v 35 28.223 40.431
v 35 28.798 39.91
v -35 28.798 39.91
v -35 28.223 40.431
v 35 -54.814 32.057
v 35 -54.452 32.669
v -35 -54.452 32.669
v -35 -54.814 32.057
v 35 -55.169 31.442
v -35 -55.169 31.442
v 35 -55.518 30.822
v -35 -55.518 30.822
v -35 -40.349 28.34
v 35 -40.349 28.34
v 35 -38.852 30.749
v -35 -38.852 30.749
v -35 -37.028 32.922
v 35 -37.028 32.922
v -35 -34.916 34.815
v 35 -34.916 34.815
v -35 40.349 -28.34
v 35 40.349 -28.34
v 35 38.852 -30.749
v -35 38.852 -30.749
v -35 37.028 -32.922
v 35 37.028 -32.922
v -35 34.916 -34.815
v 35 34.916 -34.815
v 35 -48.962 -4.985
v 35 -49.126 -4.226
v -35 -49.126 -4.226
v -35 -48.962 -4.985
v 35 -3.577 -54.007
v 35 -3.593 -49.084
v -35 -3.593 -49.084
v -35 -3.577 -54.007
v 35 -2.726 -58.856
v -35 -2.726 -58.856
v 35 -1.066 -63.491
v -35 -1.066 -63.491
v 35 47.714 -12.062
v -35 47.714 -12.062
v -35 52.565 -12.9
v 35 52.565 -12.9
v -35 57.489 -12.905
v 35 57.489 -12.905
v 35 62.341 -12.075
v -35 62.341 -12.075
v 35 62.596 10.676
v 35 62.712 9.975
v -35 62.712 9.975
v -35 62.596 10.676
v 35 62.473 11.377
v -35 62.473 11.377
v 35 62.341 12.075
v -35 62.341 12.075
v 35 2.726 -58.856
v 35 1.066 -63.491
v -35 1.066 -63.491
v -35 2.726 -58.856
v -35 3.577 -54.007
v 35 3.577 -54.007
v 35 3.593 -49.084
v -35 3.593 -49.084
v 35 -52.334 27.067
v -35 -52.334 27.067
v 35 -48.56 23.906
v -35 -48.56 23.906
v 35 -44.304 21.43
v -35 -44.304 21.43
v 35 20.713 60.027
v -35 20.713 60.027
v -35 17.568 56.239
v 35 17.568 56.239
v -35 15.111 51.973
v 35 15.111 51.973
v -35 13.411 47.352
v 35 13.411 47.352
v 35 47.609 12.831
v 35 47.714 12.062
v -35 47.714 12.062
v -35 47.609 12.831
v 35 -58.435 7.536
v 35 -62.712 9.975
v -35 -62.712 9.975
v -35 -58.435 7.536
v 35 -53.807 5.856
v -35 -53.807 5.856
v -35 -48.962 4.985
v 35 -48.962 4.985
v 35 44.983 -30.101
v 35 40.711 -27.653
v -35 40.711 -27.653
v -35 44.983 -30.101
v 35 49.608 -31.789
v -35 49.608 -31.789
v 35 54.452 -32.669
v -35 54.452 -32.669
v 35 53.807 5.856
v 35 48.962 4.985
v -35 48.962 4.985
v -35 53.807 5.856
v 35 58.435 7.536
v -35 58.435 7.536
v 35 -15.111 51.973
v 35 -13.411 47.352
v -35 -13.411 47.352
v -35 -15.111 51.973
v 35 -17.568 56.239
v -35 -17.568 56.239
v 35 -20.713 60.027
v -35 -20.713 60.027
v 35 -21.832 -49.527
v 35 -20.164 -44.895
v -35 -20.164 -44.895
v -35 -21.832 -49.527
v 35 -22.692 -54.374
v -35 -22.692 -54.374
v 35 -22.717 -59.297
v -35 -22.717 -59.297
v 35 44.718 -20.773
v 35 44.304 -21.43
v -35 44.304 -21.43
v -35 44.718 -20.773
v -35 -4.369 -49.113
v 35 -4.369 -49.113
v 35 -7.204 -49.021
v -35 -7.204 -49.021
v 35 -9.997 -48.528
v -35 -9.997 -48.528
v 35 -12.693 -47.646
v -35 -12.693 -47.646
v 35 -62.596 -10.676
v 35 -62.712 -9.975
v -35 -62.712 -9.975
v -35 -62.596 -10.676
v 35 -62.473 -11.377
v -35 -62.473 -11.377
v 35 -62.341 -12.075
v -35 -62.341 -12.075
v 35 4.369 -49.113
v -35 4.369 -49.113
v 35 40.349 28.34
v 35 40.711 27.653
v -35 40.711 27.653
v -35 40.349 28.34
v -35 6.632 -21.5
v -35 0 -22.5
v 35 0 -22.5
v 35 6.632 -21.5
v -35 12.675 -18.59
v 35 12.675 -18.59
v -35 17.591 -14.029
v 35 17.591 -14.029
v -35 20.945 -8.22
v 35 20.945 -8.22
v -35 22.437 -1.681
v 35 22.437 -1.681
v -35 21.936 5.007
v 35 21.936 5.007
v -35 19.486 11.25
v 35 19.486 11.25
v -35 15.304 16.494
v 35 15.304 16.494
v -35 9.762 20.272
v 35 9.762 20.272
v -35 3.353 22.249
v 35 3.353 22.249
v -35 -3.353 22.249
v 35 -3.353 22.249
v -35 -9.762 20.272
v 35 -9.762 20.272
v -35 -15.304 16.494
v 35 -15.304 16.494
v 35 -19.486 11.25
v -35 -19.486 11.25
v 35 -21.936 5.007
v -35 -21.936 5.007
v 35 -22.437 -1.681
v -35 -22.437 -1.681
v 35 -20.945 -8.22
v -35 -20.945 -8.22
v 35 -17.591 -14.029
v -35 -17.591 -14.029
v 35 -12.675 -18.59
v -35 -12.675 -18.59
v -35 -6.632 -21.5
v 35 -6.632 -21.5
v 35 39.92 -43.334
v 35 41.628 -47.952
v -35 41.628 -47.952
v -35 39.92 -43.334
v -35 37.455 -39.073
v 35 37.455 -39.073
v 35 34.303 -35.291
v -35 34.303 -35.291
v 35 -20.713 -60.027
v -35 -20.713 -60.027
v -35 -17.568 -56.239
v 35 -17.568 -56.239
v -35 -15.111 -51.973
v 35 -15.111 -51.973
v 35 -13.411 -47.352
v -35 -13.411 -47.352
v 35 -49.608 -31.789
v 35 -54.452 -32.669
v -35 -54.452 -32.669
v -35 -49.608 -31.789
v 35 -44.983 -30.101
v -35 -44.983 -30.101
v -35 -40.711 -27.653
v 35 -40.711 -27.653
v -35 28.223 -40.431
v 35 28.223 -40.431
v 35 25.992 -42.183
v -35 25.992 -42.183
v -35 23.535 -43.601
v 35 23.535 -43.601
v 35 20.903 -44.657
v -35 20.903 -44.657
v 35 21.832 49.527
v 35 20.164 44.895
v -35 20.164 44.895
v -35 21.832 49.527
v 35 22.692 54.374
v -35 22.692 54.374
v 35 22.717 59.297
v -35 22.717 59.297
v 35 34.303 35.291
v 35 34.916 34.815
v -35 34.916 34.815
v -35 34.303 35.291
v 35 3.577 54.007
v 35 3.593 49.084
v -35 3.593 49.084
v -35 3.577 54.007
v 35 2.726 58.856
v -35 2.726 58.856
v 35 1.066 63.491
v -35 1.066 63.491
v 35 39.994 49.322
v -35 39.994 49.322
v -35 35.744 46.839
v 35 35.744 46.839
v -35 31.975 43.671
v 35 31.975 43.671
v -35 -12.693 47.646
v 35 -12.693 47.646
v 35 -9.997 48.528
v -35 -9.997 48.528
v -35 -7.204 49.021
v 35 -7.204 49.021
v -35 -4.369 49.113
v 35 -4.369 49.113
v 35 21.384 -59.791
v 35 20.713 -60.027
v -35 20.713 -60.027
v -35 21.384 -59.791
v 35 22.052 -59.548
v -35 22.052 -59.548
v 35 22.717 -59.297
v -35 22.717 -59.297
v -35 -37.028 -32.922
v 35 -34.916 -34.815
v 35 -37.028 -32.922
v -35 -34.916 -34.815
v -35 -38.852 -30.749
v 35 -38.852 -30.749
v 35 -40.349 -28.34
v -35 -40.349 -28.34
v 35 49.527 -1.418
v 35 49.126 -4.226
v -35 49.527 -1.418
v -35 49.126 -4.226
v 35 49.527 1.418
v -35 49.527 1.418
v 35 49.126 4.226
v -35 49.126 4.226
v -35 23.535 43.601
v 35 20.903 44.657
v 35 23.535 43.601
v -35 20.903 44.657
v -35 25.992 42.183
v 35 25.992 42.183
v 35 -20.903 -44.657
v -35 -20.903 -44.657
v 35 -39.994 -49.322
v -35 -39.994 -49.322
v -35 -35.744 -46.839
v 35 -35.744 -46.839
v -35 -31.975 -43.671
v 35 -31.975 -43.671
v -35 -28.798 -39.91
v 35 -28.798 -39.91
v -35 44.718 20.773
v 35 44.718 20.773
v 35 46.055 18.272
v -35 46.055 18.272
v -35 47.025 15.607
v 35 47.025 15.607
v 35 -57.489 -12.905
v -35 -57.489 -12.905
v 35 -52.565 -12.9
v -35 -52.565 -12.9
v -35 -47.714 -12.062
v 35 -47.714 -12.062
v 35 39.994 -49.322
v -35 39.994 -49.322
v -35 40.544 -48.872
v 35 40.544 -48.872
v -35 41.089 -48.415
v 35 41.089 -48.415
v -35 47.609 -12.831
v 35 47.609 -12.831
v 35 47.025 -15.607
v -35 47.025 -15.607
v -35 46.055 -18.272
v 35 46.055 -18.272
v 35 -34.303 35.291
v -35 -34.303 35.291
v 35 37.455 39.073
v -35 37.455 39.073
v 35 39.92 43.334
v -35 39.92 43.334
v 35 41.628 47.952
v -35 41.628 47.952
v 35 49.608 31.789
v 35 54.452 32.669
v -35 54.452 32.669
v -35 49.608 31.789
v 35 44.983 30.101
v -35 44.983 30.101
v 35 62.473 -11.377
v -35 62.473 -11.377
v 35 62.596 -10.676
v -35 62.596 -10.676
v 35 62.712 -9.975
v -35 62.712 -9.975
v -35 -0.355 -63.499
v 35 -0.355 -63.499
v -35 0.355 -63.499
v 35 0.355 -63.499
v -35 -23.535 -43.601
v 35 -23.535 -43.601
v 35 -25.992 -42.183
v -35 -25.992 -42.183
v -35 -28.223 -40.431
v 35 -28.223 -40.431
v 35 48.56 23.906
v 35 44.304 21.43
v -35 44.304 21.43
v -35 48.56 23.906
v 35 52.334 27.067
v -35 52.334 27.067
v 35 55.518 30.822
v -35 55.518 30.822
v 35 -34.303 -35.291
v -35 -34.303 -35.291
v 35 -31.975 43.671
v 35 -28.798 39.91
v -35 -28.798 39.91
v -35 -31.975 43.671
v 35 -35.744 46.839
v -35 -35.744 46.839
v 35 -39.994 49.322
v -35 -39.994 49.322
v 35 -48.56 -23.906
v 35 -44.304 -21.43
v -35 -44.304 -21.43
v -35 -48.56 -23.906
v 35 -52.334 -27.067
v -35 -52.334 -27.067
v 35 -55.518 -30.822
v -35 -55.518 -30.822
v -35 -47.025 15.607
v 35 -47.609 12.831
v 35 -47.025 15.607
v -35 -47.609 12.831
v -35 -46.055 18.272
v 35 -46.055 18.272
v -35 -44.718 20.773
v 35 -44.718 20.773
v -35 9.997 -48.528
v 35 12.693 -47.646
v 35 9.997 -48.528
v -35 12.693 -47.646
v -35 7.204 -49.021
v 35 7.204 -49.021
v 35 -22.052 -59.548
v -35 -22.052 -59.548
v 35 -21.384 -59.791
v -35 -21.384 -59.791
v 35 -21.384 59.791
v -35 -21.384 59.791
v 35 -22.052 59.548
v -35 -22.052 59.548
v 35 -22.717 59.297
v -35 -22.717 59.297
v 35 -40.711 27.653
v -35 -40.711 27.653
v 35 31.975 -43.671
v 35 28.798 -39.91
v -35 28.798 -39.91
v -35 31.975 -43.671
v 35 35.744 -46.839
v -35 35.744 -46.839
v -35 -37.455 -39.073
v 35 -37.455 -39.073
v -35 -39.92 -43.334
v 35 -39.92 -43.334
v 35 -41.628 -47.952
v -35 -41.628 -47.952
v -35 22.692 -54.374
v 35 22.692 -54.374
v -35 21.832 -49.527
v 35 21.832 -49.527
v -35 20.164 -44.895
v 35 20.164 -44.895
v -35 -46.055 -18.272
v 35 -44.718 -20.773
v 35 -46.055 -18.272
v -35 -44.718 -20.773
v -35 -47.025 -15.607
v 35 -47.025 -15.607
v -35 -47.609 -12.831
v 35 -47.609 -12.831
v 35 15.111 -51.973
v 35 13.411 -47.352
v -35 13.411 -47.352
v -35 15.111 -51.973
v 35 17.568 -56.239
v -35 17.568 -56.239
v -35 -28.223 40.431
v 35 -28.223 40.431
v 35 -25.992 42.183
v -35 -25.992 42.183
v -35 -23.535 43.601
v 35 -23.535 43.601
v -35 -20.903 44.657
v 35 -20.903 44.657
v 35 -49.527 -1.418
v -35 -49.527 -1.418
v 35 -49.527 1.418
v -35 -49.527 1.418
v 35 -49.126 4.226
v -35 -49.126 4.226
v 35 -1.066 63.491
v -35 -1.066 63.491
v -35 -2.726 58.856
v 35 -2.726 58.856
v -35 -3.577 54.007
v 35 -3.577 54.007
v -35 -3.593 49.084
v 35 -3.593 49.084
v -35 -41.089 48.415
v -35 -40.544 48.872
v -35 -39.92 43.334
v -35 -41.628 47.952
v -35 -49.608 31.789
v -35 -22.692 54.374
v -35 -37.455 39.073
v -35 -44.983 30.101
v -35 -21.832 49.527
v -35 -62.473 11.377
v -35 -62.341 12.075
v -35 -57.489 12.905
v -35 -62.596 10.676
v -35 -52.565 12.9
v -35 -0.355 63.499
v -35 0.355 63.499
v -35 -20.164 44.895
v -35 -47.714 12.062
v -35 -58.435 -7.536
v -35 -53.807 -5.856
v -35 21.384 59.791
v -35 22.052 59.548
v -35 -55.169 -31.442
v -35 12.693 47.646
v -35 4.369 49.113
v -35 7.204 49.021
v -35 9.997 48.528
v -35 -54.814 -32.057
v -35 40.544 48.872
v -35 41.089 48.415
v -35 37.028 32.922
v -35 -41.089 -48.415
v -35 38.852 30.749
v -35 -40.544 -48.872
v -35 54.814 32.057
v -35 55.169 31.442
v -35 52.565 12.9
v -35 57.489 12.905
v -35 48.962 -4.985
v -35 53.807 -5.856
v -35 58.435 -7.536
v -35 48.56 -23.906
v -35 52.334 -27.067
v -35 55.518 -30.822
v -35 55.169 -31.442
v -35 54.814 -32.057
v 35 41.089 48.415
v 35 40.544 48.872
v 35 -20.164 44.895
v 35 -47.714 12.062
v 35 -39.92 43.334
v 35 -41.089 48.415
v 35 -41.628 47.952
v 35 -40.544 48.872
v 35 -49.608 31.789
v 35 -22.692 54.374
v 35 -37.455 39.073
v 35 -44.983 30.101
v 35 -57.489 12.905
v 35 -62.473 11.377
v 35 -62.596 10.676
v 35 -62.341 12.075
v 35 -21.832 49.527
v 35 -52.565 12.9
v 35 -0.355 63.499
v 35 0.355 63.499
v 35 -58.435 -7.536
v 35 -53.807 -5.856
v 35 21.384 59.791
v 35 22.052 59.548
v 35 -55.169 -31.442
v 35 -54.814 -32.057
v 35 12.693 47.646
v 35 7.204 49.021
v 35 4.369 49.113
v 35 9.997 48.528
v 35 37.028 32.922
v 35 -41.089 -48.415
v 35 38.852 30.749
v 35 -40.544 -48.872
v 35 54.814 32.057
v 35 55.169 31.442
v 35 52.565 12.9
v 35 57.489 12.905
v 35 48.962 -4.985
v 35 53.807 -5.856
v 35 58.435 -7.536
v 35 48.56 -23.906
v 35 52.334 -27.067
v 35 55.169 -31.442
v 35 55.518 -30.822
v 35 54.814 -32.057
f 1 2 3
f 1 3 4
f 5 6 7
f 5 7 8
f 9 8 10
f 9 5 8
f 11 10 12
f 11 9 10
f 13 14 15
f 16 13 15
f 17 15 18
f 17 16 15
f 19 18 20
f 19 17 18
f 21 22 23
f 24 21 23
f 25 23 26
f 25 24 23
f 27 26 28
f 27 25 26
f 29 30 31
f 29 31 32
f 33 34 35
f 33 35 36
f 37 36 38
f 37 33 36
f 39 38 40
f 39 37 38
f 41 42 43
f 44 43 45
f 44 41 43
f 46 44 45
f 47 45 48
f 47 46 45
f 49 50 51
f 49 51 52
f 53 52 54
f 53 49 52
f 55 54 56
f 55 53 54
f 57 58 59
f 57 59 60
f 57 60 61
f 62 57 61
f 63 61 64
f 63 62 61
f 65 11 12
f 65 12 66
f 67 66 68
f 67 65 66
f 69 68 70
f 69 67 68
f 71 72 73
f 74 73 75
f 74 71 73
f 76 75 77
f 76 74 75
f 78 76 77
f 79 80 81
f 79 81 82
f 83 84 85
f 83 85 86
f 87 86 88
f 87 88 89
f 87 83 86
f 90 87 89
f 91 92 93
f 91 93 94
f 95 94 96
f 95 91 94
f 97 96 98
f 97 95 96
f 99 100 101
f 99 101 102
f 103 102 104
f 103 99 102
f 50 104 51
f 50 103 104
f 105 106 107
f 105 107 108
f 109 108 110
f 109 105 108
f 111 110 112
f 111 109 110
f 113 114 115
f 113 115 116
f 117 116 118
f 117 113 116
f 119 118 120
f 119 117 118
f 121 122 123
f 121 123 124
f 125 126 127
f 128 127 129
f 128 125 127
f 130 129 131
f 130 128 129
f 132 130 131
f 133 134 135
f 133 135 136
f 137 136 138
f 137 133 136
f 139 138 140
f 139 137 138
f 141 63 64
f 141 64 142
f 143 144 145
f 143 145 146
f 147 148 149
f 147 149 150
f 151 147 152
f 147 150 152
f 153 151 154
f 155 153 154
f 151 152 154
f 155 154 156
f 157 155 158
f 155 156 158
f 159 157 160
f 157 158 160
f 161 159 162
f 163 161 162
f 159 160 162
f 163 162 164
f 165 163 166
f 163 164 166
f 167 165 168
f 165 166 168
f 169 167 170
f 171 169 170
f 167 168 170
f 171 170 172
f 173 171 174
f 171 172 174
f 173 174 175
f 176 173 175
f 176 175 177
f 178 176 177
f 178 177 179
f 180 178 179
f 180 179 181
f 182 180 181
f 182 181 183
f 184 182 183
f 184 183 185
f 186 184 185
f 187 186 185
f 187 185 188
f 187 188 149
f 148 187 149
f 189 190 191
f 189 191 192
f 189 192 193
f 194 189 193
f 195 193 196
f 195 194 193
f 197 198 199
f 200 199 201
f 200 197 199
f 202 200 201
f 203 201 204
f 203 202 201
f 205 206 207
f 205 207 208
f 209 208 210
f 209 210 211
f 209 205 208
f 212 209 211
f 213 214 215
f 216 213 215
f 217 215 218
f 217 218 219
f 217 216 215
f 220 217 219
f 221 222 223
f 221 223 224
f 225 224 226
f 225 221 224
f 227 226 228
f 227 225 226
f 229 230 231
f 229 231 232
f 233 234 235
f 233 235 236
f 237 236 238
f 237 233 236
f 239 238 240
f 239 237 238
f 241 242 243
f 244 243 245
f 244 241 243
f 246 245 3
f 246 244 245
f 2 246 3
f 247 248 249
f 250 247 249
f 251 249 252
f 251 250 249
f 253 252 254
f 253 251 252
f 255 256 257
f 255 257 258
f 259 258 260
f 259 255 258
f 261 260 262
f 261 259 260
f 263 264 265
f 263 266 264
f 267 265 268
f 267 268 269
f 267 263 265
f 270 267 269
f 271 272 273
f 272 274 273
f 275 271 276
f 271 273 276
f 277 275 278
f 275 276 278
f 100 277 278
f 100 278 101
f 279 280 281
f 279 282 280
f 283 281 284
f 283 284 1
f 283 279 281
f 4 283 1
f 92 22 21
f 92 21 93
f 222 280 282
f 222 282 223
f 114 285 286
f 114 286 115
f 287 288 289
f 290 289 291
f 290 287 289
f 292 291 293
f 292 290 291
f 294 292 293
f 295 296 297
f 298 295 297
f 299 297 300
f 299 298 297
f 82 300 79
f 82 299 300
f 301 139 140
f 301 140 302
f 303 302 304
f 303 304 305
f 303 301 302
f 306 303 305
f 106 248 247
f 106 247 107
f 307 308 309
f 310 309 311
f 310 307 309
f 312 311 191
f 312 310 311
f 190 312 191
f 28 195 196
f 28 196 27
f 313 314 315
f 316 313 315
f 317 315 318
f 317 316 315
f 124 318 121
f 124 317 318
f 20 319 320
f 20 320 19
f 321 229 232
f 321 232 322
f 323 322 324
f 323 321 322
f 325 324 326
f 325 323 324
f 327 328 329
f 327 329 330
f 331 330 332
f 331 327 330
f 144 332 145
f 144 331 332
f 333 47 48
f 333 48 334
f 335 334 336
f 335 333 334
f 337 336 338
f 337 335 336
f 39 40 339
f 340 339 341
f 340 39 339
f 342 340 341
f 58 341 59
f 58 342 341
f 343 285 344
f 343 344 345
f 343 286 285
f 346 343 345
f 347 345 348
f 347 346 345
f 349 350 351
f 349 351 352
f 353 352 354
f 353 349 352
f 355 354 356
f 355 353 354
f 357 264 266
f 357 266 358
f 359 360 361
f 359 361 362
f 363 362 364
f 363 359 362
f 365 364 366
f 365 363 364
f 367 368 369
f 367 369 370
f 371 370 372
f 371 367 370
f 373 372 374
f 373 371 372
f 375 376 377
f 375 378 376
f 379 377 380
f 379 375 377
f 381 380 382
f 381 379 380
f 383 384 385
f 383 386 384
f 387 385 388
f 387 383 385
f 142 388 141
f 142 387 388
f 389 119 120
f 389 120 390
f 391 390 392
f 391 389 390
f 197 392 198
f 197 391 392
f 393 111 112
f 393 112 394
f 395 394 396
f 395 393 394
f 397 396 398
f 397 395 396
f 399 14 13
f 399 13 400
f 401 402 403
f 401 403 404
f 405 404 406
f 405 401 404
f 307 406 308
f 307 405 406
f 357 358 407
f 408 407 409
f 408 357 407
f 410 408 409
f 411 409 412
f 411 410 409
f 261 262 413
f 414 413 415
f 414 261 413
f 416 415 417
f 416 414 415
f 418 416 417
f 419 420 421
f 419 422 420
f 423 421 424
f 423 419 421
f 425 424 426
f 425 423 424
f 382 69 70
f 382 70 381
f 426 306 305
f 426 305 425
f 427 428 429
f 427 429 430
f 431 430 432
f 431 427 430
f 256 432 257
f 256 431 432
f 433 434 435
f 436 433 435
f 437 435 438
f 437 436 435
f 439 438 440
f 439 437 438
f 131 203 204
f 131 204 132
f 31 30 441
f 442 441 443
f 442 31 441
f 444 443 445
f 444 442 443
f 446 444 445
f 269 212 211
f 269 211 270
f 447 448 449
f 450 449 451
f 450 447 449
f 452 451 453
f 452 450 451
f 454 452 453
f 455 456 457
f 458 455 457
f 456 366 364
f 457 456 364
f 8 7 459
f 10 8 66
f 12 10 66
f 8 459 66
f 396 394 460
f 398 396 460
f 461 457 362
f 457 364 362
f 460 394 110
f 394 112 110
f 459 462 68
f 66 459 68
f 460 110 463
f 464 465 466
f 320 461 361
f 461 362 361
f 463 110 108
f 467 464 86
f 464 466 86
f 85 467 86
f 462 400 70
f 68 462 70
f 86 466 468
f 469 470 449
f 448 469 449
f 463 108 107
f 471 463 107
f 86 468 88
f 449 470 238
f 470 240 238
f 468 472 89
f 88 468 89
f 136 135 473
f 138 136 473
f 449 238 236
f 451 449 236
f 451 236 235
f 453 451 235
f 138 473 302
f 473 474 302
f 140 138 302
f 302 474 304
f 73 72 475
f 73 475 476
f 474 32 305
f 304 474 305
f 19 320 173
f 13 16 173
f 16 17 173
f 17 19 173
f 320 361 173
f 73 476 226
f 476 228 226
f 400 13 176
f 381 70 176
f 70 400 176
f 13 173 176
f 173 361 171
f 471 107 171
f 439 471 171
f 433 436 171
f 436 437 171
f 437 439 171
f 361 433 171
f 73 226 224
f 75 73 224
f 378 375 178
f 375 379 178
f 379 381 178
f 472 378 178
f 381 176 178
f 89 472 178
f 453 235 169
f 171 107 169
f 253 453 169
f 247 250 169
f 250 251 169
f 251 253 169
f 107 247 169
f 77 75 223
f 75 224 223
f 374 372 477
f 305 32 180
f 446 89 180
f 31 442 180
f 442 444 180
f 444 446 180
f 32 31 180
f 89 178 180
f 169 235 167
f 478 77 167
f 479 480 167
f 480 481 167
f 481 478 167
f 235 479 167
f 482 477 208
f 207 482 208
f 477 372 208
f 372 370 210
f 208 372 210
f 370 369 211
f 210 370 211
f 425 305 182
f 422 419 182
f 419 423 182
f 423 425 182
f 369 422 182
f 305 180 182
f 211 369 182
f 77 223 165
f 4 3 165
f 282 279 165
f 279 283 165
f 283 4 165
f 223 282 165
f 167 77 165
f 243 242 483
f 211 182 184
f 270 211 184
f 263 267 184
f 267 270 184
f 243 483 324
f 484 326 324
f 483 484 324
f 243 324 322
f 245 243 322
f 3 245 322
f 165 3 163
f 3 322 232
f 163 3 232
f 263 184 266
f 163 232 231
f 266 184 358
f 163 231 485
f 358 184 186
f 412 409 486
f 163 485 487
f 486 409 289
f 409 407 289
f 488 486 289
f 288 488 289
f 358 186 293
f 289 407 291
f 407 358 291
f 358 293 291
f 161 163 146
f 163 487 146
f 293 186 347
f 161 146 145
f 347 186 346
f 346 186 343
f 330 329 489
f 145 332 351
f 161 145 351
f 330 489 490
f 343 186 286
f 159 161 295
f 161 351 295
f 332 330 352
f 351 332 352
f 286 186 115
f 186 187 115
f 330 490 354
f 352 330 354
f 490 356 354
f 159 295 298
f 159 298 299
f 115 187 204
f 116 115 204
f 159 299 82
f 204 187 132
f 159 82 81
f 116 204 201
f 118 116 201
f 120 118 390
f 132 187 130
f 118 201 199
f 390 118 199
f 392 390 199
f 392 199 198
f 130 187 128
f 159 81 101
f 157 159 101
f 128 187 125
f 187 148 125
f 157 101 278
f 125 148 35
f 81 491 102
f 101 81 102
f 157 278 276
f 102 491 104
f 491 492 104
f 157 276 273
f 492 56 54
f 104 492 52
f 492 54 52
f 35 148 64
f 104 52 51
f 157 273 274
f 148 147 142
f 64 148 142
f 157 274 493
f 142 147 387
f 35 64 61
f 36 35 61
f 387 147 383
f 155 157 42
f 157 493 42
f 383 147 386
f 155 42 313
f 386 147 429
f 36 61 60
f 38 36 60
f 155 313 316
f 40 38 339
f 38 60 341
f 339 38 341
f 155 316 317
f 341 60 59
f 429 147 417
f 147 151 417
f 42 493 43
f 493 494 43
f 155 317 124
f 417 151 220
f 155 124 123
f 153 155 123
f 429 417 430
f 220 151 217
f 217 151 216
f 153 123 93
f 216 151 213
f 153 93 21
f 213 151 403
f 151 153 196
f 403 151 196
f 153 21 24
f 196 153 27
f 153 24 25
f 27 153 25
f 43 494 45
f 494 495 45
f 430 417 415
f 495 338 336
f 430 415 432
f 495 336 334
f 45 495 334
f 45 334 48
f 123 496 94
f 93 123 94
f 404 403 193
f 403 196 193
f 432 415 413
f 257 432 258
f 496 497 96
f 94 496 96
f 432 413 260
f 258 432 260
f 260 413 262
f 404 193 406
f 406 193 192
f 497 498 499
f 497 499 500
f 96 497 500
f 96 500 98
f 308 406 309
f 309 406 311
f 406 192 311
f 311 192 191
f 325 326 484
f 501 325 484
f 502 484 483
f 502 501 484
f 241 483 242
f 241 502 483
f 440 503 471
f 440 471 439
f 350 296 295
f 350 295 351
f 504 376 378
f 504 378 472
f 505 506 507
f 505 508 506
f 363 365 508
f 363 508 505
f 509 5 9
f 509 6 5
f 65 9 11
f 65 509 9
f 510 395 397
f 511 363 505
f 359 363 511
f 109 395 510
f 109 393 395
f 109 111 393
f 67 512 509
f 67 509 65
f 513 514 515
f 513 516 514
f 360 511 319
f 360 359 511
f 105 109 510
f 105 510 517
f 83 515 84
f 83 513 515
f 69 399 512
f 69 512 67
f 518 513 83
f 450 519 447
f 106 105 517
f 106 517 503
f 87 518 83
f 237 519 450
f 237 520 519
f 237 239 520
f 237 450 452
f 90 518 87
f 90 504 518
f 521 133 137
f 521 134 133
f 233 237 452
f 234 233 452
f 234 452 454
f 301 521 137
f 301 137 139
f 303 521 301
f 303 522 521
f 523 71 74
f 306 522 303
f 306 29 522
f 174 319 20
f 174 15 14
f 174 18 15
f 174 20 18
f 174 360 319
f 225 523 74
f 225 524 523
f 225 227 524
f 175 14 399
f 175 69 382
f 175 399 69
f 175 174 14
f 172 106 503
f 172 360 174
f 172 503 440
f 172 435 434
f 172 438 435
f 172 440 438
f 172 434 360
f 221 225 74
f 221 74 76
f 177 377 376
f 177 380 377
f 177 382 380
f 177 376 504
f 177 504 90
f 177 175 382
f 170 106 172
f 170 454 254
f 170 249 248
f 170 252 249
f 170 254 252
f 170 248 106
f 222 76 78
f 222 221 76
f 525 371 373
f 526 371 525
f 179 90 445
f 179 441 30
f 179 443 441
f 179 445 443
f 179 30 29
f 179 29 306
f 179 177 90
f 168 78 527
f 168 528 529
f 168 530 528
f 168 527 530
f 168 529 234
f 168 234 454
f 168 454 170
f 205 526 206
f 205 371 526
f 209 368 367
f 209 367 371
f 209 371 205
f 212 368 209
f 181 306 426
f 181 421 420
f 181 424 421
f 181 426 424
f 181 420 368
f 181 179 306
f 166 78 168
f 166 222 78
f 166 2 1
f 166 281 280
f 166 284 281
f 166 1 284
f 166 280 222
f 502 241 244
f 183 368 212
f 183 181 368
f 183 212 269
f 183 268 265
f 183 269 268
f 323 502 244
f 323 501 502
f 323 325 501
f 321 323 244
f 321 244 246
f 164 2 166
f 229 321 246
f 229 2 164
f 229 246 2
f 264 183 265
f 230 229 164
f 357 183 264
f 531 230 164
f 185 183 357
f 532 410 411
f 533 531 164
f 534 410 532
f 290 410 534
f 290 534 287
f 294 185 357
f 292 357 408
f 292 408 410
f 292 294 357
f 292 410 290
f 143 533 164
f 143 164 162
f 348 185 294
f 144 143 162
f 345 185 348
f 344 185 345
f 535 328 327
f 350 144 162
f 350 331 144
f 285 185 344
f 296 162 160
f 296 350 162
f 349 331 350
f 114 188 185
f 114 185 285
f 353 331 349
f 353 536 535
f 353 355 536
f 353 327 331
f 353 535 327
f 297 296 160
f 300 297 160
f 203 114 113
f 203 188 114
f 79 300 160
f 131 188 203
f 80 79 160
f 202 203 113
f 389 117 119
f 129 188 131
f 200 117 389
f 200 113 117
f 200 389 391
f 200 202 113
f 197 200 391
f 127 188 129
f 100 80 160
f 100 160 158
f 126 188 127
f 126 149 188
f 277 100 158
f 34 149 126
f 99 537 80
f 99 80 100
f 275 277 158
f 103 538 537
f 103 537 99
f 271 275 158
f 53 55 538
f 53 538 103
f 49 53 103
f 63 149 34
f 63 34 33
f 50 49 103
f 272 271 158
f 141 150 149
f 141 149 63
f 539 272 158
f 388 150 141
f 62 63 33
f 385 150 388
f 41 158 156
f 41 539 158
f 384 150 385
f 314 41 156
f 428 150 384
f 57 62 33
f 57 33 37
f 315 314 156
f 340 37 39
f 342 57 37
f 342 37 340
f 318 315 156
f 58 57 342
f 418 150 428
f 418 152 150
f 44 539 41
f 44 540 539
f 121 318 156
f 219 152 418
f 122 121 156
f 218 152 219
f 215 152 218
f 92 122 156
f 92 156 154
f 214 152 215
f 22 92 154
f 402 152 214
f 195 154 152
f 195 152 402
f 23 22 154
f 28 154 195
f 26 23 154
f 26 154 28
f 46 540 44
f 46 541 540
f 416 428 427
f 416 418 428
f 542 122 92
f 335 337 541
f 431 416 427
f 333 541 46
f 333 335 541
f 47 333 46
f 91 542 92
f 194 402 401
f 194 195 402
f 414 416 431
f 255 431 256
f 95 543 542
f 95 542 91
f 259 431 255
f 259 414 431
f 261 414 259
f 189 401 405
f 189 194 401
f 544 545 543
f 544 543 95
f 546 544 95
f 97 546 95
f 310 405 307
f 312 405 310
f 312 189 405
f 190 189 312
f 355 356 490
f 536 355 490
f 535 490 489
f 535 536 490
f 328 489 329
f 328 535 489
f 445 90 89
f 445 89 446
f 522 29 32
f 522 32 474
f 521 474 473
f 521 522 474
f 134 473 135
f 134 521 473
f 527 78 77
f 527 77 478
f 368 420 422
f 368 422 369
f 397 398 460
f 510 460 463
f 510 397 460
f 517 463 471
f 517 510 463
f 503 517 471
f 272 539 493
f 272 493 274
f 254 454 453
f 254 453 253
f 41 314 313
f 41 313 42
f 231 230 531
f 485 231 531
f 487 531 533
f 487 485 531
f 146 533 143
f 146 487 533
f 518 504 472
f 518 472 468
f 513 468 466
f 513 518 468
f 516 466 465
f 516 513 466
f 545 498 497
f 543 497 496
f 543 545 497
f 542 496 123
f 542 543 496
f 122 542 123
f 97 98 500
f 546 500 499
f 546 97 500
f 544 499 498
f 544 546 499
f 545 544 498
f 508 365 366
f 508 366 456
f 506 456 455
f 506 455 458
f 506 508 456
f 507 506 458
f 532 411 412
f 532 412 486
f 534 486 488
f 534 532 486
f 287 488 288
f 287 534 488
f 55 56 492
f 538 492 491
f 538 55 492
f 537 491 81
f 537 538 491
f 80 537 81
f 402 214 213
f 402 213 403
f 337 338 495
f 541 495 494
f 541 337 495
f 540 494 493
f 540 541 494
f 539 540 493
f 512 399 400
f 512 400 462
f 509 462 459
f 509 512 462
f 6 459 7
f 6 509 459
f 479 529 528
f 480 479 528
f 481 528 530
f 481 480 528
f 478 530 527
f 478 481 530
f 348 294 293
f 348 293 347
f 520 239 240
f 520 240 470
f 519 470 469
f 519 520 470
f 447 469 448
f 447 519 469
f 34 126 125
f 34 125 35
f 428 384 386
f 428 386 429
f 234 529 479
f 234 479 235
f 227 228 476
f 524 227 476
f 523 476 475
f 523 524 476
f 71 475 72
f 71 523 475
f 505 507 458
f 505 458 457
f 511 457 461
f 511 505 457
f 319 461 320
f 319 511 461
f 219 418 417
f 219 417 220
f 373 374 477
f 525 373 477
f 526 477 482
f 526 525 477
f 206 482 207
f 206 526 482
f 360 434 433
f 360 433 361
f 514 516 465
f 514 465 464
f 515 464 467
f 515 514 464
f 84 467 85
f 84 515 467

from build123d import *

# Parameters (mm, degrees)
SKETCH1_R                = 63.5
BOSS_EXTRUDE1_DEPTH      = 35
SKETCH6_R                = 22.5
CUT_EXTRUDE4_DEPTH       = 71
CUT_EXTRUDE5_DEPTH       = 71
FILLET1_R                = 20
CIRPATTERN3_COUNT        = 18
FILLET1_OF_CIRPATTERN3_R = 20


with BuildPart() as part:
    # Sketch1 → Boss-Extrude1 (new body, symmetric)
    with BuildSketch(Plane(origin=(0, 0, 0), x_dir=(0, 0, -1), z_dir=(1, 0, 0))):
        Circle(SKETCH1_R)
    extrude(amount=BOSS_EXTRUDE1_DEPTH, both=True)

    # Sketch6 → Cut-Extrude4 (cut, through all)
    with BuildSketch(Plane(origin=(35, 0, 0), x_dir=(0, 0, -1), z_dir=(1, 0, 0))):
        Circle(SKETCH6_R)
    extrude(amount=-CUT_EXTRUDE4_DEPTH, mode=Mode.SUBTRACT)

    # Sketch7 → Cut-Extrude5 (cut, through all)
    with BuildSketch(Plane(origin=(35, 0, 0), x_dir=(0, 0, -1), z_dir=(1, 0, 0))):
        with BuildLine():
            Line((0, 50.039601818), (-4.985, 48.961883134))
            ThreePointArc((-4.985, 48.961883134), (-6.597219376, 56.157134763), (-9.975, 62.711636679))
            Line((-9.975, 62.711636679), (0, 72.167588378))
            Line((0, 72.167588378), (9.975, 62.711636679))
            ThreePointArc((9.975, 62.711636679), (6.597219376, 56.157134763), (4.985, 48.961883134))
            Line((4.985, 48.961883134), (0, 50.039601818))
        make_face()
    cut_extrude5 = extrude(amount=-CUT_EXTRUDE5_DEPTH, mode=Mode.SUBTRACT)

    # Fillet1
    fillet1_edges = [part.edges().sort_by_distance(p)[0] for p in [
        (0, 50.039601818, 0),
    ]]
    fillet(fillet1_edges, radius=FILLET1_R)

    # CirPattern3: Cut-Extrude5 ×18 about axis
    cirpattern3_axis = Axis((0, 0, 0), (1, 0, 0))
    for i in range(1, CIRPATTERN3_COUNT):
        add(cut_extrude5.rotate(cirpattern3_axis, i * 360 / CIRPATTERN3_COUNT), mode=Mode.SUBTRACT)

    # Fillet1 of CirPattern3
    fillet1_of_cirpattern3_edges = [part.edges().sort_by_distance(p)[0] for p in [
        (0, 47.021844575, 17.114551786),
        (0, 38.332558908, 32.164836042),
        (0, 25.019800909, 43.335566369),
        (0, 8.689285667, 49.279387828),
        (0, -8.689285667, 49.279387828),
        (0, -25.019800909, 43.335566369),
        (0, -38.332558908, 32.164836042),
        (0, -47.021844575, 17.114551786),
        (0, -50.039601818, 0),
        (0, -47.021844575, -17.114551786),
        (0, -38.332558908, -32.164836042),
        (0, -25.019800909, -43.335566369),
        (0, -8.689285667, -49.279387828),
        (0, 8.689285667, -49.279387828),
        (0, 25.019800909, -43.335566369),
        (0, 38.332558908, -32.164836042),
        (0, 47.021844575, -17.114551786),
    ]]
    fillet(fillet1_of_cirpattern3_edges, radius=FILLET1_OF_CIRPATTERN3_R)


solid = part.part
